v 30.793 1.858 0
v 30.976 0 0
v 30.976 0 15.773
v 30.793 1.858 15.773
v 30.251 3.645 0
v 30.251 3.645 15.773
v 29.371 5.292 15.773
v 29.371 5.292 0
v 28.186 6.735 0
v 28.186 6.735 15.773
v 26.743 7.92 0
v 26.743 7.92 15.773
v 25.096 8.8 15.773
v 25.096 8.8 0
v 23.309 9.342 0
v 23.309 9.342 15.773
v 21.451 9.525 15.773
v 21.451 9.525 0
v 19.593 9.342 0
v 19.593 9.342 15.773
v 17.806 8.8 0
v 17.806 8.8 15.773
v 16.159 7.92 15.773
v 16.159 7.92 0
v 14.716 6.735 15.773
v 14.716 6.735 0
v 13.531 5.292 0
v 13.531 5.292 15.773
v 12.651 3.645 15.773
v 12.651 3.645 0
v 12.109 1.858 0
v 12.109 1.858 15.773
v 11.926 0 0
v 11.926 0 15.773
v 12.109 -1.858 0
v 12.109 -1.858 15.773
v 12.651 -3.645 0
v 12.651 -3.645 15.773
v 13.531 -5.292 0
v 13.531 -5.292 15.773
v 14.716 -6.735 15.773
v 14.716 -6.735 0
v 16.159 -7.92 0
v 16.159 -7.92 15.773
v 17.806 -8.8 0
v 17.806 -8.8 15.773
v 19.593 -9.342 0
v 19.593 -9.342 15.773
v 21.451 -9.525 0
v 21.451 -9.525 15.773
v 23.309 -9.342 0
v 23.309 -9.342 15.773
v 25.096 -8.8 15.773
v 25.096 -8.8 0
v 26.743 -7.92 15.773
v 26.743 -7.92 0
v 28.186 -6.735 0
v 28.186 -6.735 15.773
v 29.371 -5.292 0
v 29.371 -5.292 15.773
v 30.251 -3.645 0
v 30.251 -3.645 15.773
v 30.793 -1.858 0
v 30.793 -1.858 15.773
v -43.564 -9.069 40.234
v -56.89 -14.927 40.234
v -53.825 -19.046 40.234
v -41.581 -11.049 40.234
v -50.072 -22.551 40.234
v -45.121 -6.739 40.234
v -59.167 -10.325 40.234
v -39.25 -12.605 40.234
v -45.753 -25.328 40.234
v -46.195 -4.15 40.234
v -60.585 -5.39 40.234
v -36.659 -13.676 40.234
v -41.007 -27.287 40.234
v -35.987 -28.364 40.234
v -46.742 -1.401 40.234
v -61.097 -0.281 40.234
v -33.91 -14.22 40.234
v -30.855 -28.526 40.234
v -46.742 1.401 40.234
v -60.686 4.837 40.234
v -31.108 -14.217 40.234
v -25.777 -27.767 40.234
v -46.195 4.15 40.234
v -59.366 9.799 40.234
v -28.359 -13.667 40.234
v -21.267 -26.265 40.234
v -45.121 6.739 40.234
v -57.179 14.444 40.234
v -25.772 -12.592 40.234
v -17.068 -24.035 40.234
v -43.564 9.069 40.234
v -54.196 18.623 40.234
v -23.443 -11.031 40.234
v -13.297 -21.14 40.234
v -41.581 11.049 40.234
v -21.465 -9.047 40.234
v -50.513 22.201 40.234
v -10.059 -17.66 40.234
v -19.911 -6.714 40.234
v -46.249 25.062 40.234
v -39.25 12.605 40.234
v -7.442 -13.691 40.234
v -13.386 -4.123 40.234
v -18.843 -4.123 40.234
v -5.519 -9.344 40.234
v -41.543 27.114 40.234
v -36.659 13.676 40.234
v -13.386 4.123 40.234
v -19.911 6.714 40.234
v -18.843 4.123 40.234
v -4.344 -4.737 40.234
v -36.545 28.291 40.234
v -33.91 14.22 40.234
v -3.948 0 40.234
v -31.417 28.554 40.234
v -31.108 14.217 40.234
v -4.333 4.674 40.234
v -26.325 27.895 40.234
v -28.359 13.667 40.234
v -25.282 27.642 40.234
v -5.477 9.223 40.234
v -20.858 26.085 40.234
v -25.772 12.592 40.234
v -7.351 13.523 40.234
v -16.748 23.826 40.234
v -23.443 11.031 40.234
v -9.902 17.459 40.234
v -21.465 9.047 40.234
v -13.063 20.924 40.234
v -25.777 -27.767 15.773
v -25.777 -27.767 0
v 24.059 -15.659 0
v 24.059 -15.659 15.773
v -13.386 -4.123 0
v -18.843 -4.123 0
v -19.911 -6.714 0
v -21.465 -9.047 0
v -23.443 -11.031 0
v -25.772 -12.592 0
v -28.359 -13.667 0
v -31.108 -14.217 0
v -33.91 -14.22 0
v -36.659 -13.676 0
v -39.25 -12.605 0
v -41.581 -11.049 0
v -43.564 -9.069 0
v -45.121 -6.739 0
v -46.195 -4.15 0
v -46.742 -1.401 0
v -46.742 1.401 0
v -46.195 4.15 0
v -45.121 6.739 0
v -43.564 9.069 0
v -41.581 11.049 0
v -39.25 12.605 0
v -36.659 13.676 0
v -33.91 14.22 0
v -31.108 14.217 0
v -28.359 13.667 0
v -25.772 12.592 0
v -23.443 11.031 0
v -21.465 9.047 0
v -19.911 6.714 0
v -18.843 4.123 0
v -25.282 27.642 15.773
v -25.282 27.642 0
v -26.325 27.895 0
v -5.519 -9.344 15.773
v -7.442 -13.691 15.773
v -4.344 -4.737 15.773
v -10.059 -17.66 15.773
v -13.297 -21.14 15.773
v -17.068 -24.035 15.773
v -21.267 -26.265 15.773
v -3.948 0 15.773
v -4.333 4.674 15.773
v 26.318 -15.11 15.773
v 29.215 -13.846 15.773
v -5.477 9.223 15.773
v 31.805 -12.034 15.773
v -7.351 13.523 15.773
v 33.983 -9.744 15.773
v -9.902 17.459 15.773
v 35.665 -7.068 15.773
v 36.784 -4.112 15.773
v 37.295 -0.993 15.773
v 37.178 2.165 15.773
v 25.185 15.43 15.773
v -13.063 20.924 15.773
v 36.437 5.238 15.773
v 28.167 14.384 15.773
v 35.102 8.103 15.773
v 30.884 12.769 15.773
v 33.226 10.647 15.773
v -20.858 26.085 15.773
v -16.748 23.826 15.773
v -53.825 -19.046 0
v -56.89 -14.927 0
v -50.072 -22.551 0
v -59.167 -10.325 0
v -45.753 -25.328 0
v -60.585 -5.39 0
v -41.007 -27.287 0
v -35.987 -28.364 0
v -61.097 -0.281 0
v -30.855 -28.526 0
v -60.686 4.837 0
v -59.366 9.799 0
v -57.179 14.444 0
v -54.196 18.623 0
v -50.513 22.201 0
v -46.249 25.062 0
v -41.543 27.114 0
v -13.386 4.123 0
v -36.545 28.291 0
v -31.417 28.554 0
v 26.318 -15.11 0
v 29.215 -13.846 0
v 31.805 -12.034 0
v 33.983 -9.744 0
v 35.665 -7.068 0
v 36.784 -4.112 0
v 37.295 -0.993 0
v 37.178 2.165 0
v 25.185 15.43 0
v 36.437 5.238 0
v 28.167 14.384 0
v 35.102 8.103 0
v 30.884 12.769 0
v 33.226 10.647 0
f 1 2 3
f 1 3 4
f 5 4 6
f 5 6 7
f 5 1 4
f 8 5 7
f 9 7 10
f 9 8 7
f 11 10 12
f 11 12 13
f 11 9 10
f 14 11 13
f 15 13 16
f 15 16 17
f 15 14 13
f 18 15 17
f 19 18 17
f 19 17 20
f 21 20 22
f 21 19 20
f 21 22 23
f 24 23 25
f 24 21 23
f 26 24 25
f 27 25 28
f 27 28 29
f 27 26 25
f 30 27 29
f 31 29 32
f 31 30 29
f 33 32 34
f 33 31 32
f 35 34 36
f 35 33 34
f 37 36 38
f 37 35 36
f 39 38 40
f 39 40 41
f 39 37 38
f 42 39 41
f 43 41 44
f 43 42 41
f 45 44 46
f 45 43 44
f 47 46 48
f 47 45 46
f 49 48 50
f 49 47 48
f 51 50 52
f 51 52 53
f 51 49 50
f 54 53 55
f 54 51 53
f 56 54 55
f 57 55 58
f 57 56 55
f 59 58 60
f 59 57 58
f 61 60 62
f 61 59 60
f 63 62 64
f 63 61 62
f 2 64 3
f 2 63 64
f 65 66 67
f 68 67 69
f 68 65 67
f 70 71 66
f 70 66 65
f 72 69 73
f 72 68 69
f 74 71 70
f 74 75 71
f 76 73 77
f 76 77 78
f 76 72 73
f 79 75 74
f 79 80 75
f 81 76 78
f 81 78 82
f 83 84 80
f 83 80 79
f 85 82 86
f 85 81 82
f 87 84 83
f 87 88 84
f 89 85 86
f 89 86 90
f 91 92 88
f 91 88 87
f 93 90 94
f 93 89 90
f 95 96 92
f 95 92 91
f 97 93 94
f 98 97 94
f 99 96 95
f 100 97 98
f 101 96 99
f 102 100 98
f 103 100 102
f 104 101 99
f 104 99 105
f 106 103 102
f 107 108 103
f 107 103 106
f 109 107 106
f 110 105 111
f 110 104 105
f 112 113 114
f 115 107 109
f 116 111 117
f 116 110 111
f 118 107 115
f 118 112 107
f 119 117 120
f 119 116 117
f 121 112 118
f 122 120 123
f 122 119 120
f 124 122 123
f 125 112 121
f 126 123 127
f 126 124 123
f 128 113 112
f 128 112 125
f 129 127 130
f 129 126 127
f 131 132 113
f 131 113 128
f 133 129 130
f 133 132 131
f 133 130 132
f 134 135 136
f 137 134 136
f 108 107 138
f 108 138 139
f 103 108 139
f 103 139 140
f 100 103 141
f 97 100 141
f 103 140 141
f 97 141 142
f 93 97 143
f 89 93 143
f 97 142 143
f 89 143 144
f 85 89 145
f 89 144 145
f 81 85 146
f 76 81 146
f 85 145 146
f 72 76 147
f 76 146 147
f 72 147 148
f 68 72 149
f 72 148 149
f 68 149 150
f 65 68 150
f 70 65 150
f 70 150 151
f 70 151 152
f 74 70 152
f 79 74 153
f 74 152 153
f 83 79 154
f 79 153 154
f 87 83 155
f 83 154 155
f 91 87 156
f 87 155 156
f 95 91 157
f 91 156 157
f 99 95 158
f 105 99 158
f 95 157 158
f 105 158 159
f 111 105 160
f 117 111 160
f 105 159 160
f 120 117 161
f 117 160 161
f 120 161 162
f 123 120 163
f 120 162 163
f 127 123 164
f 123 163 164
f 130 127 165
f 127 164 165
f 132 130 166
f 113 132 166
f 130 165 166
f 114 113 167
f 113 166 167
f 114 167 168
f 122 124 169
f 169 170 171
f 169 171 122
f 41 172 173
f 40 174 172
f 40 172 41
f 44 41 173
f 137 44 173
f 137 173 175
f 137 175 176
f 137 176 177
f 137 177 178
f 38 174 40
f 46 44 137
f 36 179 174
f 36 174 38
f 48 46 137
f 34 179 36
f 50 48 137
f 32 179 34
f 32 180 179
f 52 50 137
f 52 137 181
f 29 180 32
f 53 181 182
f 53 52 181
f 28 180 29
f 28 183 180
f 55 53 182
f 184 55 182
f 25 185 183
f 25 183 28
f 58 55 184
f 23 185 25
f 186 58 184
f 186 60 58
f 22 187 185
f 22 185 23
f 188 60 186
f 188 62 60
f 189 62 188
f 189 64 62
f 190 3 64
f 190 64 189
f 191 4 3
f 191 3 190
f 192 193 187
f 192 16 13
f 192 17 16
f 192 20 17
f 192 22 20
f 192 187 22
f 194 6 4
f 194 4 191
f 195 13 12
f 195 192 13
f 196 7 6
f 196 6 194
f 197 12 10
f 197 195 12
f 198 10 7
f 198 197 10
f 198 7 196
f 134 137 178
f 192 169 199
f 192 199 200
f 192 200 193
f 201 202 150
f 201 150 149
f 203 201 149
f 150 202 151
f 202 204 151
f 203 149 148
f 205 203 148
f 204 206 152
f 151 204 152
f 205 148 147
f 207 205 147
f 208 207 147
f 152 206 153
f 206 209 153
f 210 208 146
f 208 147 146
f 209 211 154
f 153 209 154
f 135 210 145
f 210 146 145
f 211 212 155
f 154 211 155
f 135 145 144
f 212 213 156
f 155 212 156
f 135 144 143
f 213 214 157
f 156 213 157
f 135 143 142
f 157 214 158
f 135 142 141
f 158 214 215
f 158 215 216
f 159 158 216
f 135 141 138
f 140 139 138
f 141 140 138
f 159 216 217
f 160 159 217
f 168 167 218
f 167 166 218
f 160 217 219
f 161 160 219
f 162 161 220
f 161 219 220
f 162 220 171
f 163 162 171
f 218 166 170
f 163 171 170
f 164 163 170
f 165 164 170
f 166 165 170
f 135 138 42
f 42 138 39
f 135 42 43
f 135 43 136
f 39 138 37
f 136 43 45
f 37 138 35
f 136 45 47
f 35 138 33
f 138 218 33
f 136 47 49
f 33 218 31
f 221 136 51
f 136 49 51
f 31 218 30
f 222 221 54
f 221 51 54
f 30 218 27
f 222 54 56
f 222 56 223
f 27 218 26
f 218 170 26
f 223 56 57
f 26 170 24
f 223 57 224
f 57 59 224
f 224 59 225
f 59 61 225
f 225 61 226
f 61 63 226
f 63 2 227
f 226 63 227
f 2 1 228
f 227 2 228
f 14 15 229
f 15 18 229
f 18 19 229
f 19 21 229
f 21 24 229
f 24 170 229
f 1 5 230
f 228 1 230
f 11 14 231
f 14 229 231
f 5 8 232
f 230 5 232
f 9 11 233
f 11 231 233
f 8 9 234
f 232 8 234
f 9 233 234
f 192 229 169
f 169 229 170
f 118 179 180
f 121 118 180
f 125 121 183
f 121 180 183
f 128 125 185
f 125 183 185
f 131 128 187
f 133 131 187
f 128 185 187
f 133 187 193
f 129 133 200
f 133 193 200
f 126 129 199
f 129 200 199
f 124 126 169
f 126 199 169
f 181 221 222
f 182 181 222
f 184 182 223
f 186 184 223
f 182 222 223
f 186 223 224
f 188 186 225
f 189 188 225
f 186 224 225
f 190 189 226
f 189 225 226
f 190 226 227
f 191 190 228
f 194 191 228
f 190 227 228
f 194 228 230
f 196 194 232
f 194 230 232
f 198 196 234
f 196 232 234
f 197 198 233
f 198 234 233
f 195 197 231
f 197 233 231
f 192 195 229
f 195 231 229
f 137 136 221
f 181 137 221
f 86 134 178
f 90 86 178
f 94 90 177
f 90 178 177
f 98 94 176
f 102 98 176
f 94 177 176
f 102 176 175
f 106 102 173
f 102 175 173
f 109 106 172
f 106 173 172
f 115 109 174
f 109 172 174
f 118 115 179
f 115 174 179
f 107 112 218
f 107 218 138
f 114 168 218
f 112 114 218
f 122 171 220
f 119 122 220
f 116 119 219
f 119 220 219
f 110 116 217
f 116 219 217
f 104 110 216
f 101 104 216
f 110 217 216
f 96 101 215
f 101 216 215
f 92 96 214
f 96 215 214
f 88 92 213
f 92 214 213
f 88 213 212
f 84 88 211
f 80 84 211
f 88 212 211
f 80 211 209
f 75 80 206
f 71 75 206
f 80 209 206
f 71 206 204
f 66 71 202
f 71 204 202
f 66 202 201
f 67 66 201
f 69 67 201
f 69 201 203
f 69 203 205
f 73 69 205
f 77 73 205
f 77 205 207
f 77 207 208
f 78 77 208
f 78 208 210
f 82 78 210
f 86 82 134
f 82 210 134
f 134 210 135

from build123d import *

# Parameters (mm, degrees)
F0_R     = 25.4
F1_DEPTH = 40.2336
F0_R_2   = 9.525
F2_DEPTH = 15.7734


with BuildPart() as f1:
    # F0 (on Top) → F1 (new body)
    with BuildSketch(Plane.XY):
        with BuildLine():
            Line((-25.28207, 27.642332), (-26.324773, 27.894657))
            ThreePointArc((-26.324773, 27.894657), (-61.096783, -0.281283), (-25.776829, -27.767227))
            ThreePointArc((-25.776829, -27.767227), (-10.058643, -17.660062), (-3.948128, 0))
            ThreePointArc((-3.948128, 0), (-9.901856, 17.458777), (-25.28207, 27.642332))
        make_face()
        with Locations((-32.523148, 0)):
            Circle(F0_R, mode=Mode.SUBTRACT)
        with Locations((-32.523148, 0)):
            Circle(F0_R)
        with BuildLine():
            ThreePointArc((-18.843367, -4.122653), (-46.810648, 0), (-18.843367, 4.122653))
            Line((-18.843367, 4.122653), (-13.386128, 4.122653))
            Line((-13.386128, 4.122653), (-13.386128, -4.122653))
            Line((-13.386128, -4.122653), (-18.843367, -4.122653))
        make_face(mode=Mode.SUBTRACT)
    extrude(amount=F1_DEPTH)

    # F0 (on Top) → F2 (join)
    with BuildSketch(Plane.XY):
        with BuildLine():
            ThreePointArc((-3.948128, 0), (-10.058643, -17.660062), (-25.776829, -27.767227))
            Line((-25.776829, -27.767227), (24.059165, -15.659087))
            Line((24.059165, -15.659087), (26.318371, -15.110191))
            ThreePointArc((26.318371, -15.110191), (37.314952, 0.589055), (25.184714, 15.429824))
            Line((25.184714, 15.429824), (-25.28207, 27.642332))
            ThreePointArc((-25.28207, 27.642332), (-9.901856, 17.458777), (-3.948128, 0))
        make_face()
        with Locations((21.450878, 0.000175)):
            Circle(F0_R_2, mode=Mode.SUBTRACT)
    extrude(amount=F2_DEPTH)


solid = f1.part
